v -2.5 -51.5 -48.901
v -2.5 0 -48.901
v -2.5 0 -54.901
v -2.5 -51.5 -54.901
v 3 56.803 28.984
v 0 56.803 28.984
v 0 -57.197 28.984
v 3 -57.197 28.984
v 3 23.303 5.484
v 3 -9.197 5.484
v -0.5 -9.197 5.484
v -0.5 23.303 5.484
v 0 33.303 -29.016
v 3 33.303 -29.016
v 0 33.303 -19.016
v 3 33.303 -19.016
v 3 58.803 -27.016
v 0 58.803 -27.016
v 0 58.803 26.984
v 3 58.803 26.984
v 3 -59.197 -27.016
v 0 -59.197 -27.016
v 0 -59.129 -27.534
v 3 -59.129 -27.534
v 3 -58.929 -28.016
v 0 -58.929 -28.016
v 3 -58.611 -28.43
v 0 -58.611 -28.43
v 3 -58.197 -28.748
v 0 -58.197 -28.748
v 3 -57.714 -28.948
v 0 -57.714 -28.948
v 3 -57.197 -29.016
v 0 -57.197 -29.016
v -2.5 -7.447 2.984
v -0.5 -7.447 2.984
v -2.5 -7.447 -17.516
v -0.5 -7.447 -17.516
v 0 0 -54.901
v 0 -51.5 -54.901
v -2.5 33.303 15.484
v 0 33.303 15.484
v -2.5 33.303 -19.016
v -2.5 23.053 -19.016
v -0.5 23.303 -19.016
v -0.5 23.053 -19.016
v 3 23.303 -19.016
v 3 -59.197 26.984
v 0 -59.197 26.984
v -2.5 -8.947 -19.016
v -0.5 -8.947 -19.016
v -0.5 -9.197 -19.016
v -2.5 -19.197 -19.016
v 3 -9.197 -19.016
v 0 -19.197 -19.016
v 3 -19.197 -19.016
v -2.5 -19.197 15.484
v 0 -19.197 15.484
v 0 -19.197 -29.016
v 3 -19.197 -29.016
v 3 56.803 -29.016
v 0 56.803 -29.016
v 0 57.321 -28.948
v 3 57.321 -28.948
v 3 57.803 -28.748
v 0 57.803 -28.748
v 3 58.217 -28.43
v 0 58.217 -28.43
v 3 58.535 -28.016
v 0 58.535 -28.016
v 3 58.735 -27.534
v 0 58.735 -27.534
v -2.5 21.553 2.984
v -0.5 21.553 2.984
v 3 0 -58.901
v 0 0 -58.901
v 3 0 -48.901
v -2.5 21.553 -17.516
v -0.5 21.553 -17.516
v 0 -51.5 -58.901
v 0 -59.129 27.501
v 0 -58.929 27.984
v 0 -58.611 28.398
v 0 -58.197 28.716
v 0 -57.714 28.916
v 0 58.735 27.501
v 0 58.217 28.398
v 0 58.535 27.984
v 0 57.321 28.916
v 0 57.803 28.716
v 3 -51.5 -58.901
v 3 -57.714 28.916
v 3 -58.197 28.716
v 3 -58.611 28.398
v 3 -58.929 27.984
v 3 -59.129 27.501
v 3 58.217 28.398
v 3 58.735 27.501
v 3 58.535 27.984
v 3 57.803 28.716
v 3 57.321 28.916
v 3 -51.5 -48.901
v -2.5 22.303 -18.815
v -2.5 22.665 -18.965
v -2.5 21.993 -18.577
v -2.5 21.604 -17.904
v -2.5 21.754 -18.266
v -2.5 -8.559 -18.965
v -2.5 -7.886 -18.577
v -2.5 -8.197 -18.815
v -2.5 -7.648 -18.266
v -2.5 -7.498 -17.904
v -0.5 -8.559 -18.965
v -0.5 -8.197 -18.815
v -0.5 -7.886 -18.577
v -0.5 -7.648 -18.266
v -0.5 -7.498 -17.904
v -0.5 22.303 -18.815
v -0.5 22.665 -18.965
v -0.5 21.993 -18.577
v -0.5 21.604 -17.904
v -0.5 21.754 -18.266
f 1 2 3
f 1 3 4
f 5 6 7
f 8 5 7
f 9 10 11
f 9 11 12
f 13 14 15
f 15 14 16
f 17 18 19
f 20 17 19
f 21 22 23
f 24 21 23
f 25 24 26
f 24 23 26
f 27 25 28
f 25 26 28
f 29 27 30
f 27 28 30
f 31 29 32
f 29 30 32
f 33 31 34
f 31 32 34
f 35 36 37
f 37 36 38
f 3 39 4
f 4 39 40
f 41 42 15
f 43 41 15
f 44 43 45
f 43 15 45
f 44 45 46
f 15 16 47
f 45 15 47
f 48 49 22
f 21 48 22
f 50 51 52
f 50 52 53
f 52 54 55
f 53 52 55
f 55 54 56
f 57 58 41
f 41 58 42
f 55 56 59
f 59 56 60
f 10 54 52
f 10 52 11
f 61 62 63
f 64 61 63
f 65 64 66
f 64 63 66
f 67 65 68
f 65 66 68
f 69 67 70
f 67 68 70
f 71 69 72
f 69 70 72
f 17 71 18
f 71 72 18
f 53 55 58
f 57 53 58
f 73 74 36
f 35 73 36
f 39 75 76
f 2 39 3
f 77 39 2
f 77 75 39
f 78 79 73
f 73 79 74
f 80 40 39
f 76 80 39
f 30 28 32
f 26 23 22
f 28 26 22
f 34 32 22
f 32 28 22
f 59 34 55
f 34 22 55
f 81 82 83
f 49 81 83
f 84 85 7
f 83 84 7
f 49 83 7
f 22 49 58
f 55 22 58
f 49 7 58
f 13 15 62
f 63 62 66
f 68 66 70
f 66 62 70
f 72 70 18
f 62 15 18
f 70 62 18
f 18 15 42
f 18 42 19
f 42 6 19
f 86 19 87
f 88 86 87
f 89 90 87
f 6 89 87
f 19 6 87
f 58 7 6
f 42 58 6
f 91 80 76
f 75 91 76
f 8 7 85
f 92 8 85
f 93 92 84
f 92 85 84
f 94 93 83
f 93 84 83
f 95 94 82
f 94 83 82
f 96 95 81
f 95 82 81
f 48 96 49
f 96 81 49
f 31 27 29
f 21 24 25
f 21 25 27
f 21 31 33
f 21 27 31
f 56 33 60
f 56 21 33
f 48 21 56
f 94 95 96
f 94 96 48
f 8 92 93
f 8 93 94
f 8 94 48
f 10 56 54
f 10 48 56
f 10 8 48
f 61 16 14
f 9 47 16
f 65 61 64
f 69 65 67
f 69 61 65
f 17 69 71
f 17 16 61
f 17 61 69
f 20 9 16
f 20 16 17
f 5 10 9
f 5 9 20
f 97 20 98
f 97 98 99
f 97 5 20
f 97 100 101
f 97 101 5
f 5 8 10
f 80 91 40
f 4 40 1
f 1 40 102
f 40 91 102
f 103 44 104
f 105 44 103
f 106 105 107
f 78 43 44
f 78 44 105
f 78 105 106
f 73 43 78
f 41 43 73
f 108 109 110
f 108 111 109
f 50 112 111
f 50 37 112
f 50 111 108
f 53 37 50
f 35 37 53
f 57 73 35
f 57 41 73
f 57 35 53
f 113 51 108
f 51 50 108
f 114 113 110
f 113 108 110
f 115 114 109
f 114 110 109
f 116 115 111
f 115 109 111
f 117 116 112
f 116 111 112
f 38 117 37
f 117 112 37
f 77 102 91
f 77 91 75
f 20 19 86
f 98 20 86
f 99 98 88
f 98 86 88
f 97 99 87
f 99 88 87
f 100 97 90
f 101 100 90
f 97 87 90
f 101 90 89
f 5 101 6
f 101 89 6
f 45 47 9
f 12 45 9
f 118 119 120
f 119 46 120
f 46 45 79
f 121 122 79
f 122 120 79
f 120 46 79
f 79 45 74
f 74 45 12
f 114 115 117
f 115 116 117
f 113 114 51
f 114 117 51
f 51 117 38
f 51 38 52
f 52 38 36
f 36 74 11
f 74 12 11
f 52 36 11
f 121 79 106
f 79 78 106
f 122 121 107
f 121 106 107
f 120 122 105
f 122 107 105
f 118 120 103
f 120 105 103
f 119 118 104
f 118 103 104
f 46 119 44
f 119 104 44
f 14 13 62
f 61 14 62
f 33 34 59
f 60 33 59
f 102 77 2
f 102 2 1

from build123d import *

# Parameters (mm, degrees)
F1_DEPTH = 3
F0_W     = 51.5
F0_H     = 10
F2_W     = 32.5
F2_H     = 24.5
F3_DEPTH = 3.5
F5_DEPTH = 2.5
F6_DEPTH = 0.5
F7_W     = 51.5
F7_H     = 6
F8_DEPTH = 2.5
F9_R     = 1.5


with BuildPart() as f1:
    # F0 (on Right) → F1 (new body)
    with BuildSketch(Plane.YZ):
        with BuildLine():
            Line((56.8031638018, 28.9837977201), (-57.1968361982, 28.9837977201))
            ThreePointArc((-57.1968361982, 28.9837977201), (-58.6110497606, 28.3980112824), (-59.1968361982, 26.9837977201))
            Line((-59.1968361982, 26.9837977201), (-59.1968361982, -27.0162022799))
            ThreePointArc((-59.1968361982, -27.0162022799), (-58.6110497606, -28.4304158423), (-57.1968361982, -29.0162022799))
            Line((-57.1968361982, -29.0162022799), (56.8031638018, -29.0162022799))
            ThreePointArc((56.8031638018, -29.0162022799), (58.2173773641, -28.4304158423), (58.8031638018, -27.0162022799))
            Line((58.8031638018, -27.0162022799), (58.8031638018, 26.9837977201))
            ThreePointArc((58.8031638018, 26.9837977201), (58.2173773641, 28.3980112824), (56.8031638018, 28.9837977201))
        make_face()
    extrude(amount=F1_DEPTH)

    # F2 (on face) → F3 (cut)
    with BuildSketch(Plane.YZ.offset(3)):
        with Locations((7.0531638018, -6.7662022799)):
            Rectangle(F2_W, F2_H)
        Polygon((33.3031638018, -19.0162022799), (23.3031638018, -19.0162022799), (-9.1968361982, -19.0162022799), (-19.1968361982, -19.0162022799), (-19.1968361982, -29.0162022799), (33.3031638018, -29.0162022799), align=None)
    extrude(amount=-F3_DEPTH, mode=Mode.SUBTRACT)

    # F4 (on face) → F5 (join)
    with BuildSketch(Plane(origin=(0, 0, 0), x_dir=(0, -1, 0), z_dir=(-1, 0, 0))):
        Polygon((-33.3031638018, 15.4837977201), (-33.3031638018, -19.0162022799), (-23.3031638018, -19.0162022799), (-23.3031638018, 5.4837977201), (9.1968361982, 5.4837977201), (9.1968361982, -19.0162022799), (19.1968361982, -19.0162022799), (19.1968361982, 15.4837977201), align=None)
        Polygon((-23.3031638018, 5.4837977201), (-23.3031638018, -19.0162022799), (-21.5531638018, -19.0162022799), (-21.5531638018, 2.9837977201), (7.4468361982, 2.9837977201), (7.4468361982, -19.0162022799), (9.1968361982, -19.0162022799), (9.1968361982, 5.4837977201), align=None)
    extrude(amount=F5_DEPTH)

    # F6 (cut): a face of the model
    f6_faces = [f1.faces().sort_by_distance(p)[0] for p in [
        (0, 22.8961625733, -6.7662022799),
    ]]
    extrude(f6_faces, amount=-F6_DEPTH, mode=Mode.SUBTRACT)

    # F9
    f9_edges = [f1.edges().sort_by_distance(p)[0] for p in [
        (-1.5, -7.446836, -19.016202),
        (-1.5, 21.553164, -19.016202),
    ]]
    fillet(f9_edges, radius=F9_R)


with BuildPart() as f1b:
    # F0 (on Right) → F1, piece 2 (new body)
    with BuildSketch(Plane.YZ):
        with Locations((-25.75, -53.901425451)):
            Rectangle(F0_W, F0_H)
    extrude(amount=F1_DEPTH)

    # F7 (on face) → F8 (join)
    with BuildSketch(Plane(origin=(0, 0, 0), x_dir=(0, -1, 0), z_dir=(-1, 0, 0))):
        with Locations((25.75, -51.901425451)):
            Rectangle(F7_W, F7_H)
    extrude(amount=F8_DEPTH)


solid = Compound([f1.part, f1b.part])
